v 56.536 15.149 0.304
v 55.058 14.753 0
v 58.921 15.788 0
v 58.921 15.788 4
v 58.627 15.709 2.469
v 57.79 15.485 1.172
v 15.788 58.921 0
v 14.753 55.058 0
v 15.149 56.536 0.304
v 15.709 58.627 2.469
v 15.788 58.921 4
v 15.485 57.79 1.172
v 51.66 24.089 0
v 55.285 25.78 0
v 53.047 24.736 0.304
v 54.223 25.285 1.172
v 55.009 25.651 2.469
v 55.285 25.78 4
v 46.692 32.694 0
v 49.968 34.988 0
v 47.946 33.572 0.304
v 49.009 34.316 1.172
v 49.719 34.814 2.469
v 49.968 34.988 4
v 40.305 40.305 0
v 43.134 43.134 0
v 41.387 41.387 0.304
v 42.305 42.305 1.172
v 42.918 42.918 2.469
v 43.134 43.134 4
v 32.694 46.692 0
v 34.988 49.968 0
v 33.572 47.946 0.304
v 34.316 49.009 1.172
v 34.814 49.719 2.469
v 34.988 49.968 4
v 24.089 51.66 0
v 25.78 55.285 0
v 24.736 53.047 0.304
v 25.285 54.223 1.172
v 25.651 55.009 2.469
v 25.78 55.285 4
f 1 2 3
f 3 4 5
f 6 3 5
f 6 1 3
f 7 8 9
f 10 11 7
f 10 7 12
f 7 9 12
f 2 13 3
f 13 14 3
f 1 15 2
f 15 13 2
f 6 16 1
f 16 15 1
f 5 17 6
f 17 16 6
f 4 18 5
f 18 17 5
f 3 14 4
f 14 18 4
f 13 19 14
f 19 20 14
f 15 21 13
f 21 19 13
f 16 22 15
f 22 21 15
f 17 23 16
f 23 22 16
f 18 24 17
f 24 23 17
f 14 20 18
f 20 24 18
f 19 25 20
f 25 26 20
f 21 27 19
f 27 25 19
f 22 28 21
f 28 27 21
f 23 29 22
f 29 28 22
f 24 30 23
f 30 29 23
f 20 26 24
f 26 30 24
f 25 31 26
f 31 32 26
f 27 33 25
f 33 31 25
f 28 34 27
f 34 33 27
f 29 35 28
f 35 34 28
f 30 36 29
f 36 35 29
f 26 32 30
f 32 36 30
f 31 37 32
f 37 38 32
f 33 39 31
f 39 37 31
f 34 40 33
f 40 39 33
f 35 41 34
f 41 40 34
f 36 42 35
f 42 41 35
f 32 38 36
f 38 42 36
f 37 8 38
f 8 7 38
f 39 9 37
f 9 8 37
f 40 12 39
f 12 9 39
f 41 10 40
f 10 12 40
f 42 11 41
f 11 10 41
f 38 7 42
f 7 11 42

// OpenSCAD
// file: coveExtrude.scad
// openscad module to make an extruded polyhedron for a quarter-round
// cove-molding shape along a circular path.  Written 22 May 2019 by
// James Waldby.  © 2019.  Available for use without warranty under
// GPL v3 terms per http://www.gnu.org/licenses/gpl.html

module coveMold (edgeRadius=4,     // Edge-rounding radius
                 circleRadius=100, // Circle radius
                 startAngle=0,     // Start angle
                 endAngle=90,      // End angle
                 stepsPerCircle=60, // Segments per circle
                 stepsPerCove=5,    // Points in cove quarter-round
                 showDetails=false) // Whether to print recurve points
{ eps = 0.01;
  // Make list with x,y pairs for shape to extrude
  // Need 90+epsilon to prevent missing 90, particularly if stepsPerCove=8
  recurve = [for(qangle=[0 : 90/(stepsPerCove-1) : 90+eps])
      [circleRadius-edgeRadius*(1-sin(qangle)),
       edgeRadius*(1-cos(qangle))], [circleRadius, 0]];
  if (showDetails) echo("recurve",recurve);
  rotate(a=[0,0,startAngle])
    rotate_extrude(angle=endAngle-startAngle, convexity=10, $fn=stepsPerCircle)
      polygon(points=recurve);
}
/* Local Variables:   */
/* mode:        scad  */
/* tab-width:      2  */
/* c-basic-offset: 2  */
/* End:               */
// main file
/* [Radius Params:] */
// Edge-rounding radius
edgeRound=4;
// Circle radius
circRadi=61;
// Start angle
startAngle=15;
// End angle
endAngle=75;
// Segments per circle
$fn=40;
// Points in quarter-round (0-90 degrees)
QRn=5;
// Show point and rectangles lists
showDetails=false;

use <coveExtrude.scad>

coveMold (edgeRound, circRadi, startAngle, endAngle, $fn, QRn, showDetails);

/* Local Variables:   */
/* mode:        scad  */
/* tab-width:      2  */
/* c-basic-offset: 2  */
/* End:               */
